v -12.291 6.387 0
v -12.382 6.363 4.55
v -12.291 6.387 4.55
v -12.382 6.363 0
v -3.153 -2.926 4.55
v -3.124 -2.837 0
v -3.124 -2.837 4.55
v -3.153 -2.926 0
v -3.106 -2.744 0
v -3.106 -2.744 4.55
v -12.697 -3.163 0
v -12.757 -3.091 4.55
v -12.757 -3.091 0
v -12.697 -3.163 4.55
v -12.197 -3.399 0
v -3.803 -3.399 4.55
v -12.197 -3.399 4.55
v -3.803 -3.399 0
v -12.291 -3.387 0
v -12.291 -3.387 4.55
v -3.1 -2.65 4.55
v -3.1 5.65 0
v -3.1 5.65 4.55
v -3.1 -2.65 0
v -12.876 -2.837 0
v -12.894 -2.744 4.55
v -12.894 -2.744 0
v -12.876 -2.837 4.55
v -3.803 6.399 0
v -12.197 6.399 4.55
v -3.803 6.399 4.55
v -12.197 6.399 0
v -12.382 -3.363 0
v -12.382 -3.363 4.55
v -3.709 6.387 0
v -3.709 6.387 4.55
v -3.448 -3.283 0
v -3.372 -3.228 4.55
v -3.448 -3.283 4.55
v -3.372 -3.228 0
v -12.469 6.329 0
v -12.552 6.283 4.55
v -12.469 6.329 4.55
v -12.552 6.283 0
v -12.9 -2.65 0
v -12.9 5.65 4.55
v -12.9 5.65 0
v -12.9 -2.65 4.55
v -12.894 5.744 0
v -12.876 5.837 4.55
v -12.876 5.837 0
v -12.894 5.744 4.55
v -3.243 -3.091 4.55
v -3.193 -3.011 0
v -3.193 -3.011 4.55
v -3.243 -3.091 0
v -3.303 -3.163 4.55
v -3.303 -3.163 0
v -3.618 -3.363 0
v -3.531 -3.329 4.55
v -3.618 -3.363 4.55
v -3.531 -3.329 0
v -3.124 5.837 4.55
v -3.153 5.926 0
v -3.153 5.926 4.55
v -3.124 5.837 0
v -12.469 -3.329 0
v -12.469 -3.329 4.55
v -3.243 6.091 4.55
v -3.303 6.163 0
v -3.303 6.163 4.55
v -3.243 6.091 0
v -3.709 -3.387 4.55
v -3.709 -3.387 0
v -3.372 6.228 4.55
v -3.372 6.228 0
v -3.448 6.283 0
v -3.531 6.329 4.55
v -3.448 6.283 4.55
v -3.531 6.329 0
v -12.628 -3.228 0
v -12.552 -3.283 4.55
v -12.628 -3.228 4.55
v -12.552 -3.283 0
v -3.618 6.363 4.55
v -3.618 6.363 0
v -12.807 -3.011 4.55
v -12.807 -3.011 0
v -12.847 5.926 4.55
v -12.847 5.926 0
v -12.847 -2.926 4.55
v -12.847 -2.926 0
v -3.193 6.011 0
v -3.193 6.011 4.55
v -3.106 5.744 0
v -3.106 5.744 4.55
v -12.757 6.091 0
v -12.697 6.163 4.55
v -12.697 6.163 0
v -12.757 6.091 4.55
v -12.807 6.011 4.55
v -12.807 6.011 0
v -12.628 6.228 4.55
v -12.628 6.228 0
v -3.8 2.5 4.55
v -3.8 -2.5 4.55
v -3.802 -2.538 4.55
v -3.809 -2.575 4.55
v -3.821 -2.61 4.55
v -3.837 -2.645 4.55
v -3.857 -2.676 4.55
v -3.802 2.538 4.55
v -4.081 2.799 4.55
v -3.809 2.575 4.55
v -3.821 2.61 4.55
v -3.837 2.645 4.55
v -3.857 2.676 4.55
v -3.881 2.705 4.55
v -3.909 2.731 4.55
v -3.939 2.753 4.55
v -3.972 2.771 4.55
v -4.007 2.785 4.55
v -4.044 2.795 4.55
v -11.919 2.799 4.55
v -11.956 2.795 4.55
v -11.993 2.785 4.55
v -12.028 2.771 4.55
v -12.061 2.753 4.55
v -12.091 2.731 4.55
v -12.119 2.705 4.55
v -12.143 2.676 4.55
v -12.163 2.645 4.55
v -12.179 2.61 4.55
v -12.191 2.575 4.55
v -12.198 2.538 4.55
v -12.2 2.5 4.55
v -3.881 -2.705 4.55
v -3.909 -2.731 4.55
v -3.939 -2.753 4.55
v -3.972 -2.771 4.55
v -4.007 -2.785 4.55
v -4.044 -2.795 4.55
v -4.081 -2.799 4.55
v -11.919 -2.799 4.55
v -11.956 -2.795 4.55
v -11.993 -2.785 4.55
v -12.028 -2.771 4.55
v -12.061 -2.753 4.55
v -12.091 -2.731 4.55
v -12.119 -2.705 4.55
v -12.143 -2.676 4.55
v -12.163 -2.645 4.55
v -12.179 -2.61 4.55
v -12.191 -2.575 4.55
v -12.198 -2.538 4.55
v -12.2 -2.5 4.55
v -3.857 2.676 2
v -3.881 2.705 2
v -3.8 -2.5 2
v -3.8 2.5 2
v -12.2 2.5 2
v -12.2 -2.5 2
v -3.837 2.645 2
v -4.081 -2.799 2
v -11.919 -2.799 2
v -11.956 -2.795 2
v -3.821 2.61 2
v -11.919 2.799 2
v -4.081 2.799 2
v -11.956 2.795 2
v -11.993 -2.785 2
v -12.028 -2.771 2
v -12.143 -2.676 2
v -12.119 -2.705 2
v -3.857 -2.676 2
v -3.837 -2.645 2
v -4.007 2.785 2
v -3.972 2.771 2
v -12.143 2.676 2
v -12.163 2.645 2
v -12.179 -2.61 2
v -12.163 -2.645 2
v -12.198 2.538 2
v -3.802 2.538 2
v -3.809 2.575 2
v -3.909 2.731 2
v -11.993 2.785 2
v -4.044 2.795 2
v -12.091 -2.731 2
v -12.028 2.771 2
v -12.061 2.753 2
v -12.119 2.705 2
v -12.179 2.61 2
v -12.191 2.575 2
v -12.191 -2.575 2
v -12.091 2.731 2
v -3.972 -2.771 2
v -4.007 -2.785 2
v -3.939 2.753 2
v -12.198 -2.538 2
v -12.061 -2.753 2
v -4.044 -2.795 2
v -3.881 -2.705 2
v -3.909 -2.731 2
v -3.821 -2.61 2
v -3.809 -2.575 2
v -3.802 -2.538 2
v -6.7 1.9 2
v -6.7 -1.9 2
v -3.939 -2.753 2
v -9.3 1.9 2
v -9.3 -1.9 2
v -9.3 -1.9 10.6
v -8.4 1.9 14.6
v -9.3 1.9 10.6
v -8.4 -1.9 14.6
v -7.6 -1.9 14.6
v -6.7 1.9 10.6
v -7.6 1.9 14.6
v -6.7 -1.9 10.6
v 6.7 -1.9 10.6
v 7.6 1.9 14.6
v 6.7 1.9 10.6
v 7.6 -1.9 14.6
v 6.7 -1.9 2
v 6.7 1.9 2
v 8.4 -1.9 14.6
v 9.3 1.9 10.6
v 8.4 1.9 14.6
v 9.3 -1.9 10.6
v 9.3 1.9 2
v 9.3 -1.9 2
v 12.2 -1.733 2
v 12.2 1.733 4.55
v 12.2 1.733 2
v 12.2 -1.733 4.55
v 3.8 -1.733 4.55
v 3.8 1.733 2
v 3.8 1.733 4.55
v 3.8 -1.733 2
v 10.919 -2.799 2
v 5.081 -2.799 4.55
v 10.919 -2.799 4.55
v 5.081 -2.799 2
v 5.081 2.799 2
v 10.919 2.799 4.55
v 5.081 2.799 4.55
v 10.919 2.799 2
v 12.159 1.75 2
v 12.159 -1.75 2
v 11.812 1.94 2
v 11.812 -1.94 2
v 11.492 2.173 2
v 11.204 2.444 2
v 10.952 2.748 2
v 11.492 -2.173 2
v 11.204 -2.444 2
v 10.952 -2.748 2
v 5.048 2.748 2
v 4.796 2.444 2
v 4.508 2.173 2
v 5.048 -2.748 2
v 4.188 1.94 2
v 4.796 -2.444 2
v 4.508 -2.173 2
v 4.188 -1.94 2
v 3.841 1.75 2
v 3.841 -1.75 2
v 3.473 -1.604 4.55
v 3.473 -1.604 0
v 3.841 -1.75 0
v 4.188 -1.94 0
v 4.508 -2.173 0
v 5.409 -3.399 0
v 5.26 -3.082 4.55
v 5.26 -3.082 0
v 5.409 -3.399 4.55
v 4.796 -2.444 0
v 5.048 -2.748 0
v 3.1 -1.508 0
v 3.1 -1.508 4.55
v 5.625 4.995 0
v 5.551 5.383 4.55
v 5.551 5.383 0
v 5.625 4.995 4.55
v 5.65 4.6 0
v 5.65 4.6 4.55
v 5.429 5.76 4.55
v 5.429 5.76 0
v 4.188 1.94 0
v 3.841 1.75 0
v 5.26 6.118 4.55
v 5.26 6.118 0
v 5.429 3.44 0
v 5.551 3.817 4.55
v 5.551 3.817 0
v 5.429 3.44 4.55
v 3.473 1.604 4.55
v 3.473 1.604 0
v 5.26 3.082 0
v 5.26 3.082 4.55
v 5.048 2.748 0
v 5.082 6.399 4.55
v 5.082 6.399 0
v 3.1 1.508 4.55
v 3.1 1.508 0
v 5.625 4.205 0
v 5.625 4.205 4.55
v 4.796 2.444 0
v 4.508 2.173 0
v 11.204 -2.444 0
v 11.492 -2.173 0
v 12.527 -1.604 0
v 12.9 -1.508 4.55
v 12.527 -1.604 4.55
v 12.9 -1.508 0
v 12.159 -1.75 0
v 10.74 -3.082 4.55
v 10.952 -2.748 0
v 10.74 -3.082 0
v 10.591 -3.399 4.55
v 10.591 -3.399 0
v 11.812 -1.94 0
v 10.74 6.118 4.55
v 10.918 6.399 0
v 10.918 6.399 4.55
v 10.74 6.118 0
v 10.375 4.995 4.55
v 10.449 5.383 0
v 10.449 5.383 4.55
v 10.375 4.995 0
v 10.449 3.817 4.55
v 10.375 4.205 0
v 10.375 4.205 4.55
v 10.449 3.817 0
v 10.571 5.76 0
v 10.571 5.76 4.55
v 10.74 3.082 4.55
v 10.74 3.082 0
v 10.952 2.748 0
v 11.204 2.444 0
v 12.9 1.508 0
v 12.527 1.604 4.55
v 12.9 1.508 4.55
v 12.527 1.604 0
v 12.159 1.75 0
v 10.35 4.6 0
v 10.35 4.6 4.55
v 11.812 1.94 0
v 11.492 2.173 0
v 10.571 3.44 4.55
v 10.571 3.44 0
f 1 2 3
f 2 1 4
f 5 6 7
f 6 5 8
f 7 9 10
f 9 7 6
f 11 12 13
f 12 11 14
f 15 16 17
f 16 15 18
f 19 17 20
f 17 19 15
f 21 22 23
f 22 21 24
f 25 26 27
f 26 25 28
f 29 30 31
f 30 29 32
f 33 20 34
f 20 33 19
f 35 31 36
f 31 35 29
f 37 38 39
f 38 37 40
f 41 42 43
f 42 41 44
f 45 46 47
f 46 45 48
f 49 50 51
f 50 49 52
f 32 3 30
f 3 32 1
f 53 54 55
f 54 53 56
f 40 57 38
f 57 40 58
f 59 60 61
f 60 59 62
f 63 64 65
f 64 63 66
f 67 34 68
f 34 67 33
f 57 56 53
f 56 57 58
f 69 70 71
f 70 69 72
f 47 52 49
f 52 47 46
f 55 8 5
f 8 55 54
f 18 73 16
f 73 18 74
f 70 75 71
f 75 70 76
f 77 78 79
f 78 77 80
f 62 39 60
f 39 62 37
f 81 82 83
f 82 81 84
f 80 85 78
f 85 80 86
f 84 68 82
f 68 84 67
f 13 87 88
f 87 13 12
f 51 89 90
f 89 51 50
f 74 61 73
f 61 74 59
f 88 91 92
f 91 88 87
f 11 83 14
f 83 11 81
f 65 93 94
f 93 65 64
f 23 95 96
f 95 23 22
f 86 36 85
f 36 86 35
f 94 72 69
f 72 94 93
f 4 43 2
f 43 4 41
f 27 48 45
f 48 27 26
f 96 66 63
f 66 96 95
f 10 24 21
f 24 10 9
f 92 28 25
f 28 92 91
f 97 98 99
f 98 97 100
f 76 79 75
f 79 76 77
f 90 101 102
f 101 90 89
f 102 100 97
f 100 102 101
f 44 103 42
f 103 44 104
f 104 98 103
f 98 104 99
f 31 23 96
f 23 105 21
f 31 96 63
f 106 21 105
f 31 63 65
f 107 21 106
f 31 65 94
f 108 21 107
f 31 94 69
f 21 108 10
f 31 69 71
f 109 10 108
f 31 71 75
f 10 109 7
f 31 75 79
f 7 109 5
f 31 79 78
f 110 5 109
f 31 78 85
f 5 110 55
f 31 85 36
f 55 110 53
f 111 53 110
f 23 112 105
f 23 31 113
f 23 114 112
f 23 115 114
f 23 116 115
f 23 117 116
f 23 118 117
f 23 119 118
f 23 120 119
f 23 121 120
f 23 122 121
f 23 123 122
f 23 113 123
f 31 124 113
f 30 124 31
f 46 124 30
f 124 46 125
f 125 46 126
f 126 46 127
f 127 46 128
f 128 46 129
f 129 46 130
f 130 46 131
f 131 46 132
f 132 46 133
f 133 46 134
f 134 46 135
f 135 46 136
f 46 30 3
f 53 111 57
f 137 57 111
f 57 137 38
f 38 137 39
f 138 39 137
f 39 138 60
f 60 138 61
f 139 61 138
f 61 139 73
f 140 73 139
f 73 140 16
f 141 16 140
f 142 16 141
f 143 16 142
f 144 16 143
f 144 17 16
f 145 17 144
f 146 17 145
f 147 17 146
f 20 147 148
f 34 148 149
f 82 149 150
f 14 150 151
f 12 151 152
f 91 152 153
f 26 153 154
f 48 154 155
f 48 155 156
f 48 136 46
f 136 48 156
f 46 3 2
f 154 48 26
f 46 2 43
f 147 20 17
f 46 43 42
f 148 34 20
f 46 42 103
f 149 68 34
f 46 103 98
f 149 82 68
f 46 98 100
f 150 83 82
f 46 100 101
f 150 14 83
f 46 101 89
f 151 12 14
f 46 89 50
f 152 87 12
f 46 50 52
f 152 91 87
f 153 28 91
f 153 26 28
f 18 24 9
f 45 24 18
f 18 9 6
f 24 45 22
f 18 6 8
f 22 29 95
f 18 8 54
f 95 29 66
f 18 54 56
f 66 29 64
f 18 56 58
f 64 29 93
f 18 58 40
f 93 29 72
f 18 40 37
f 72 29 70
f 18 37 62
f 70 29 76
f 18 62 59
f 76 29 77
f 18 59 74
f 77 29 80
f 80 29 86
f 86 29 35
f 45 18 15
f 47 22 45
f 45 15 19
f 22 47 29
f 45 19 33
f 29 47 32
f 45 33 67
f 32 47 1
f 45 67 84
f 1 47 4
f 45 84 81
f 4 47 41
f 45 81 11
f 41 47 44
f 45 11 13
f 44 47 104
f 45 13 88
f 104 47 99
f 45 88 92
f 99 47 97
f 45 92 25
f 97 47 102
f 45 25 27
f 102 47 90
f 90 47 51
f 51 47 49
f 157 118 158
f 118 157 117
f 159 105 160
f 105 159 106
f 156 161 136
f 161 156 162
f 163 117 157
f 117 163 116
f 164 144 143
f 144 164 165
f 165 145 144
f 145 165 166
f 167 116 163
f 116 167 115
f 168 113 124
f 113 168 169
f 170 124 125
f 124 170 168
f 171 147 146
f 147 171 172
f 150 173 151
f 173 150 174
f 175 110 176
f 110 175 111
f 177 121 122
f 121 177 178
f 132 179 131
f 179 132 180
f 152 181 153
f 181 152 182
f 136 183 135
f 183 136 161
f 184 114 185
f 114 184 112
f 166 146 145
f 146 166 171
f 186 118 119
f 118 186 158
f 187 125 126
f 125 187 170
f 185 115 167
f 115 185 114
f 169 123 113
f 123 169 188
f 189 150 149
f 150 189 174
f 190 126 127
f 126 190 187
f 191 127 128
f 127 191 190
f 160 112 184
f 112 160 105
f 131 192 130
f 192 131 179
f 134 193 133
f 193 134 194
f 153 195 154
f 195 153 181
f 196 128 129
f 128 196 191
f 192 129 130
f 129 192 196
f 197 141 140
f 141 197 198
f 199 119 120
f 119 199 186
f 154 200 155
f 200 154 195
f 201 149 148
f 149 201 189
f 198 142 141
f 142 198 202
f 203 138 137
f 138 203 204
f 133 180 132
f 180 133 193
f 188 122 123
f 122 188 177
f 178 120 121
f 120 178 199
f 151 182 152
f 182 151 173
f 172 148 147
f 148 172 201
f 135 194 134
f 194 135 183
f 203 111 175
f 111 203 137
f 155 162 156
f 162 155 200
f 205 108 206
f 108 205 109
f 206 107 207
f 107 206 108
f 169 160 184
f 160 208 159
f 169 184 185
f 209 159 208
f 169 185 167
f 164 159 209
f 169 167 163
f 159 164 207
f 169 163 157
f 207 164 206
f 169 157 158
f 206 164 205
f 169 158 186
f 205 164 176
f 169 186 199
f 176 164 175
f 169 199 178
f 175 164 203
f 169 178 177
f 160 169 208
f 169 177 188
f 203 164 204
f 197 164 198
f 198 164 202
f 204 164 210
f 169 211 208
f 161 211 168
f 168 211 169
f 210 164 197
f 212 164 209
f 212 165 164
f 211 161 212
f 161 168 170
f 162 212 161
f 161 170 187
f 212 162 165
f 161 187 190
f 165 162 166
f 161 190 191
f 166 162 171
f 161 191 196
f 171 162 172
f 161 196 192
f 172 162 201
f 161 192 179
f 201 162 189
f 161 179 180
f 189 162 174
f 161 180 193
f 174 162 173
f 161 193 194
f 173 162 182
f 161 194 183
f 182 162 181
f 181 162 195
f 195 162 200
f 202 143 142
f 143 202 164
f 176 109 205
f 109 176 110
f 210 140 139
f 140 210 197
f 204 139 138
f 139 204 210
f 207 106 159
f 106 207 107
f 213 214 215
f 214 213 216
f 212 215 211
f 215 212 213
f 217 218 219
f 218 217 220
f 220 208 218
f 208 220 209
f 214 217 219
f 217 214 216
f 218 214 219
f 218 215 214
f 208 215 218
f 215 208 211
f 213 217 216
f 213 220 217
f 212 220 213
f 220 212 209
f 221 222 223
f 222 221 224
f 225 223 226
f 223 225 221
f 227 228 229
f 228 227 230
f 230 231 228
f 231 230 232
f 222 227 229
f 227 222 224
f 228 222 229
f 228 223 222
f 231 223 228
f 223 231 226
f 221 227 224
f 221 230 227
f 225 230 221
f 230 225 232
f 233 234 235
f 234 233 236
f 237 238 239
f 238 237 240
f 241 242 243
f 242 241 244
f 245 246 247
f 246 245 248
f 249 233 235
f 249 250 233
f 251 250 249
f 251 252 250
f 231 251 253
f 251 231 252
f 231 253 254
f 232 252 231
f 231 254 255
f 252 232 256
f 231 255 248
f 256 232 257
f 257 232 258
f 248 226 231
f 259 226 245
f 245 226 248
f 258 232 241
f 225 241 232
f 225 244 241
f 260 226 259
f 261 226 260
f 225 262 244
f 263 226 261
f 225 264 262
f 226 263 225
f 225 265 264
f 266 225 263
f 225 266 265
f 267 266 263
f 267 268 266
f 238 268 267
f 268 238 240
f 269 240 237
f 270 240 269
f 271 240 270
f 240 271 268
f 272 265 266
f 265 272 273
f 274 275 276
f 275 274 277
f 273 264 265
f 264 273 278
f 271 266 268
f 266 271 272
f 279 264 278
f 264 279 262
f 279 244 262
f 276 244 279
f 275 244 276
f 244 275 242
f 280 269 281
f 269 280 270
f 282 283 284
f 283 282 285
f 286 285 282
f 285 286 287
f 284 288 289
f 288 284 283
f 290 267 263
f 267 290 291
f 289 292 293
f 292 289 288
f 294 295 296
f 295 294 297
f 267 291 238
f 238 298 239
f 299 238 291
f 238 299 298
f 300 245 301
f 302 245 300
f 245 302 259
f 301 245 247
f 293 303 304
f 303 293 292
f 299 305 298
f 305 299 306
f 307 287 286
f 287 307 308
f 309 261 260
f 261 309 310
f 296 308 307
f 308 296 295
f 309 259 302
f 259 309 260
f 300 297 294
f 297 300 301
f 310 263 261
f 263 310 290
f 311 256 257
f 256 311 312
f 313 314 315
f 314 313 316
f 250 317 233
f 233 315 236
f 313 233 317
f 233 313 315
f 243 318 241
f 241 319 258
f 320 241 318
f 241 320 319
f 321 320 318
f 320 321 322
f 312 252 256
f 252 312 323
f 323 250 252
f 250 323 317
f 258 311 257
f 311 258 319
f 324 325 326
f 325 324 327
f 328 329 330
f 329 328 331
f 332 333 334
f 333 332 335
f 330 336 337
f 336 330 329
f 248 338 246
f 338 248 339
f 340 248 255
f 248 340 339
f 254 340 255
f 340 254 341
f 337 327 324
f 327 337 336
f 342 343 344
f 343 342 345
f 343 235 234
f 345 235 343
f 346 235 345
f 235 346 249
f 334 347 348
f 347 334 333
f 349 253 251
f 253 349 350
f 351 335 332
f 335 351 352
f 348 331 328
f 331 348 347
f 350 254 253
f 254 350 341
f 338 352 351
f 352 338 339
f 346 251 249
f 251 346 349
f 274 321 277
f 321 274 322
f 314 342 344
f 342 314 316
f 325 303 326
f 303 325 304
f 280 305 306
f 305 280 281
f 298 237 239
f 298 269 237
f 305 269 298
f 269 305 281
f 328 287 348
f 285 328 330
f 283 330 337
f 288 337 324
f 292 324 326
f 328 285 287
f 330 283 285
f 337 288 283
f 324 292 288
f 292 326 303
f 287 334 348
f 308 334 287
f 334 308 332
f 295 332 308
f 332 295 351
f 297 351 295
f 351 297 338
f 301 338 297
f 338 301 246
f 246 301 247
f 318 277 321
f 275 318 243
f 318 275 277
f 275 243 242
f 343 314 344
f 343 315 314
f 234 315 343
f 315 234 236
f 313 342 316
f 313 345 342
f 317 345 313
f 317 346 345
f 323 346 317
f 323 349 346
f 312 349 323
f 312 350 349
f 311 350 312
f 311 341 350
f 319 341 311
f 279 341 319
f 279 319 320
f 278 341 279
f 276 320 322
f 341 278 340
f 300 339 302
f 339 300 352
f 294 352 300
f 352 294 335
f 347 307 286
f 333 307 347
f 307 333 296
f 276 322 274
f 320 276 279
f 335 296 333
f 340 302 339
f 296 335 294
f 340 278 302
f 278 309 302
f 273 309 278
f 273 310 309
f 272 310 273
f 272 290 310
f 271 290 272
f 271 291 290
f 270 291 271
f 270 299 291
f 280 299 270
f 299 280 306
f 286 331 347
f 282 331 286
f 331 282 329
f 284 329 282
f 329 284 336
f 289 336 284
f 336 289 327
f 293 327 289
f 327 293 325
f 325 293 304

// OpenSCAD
translate([-8,0,0]) { 
// Archived geometry from ../../validation_v7_joiners/previous_current/parts/oobb_organization_storage_drawer_unit_rectangle_100_ml_tamper_evident_systempak_209_container_2_column_2_row_ai_version_7_style_unit_2_wide_2_tall/front_plug_square.scad
$fn = 50;

difference() {
	union() {
		translate(v = [0, 0, 0]) {
			rotate(a = [0, 0, 0]) {
				difference() {
					union() {
						translate(v = [0, 0, 0]) {
							rotate(a = [0, 0, 0]) {
								difference() {
									union() {
										translate(v = [0, 0, 0]) {
											rotate(a = [0, 0, 0]) {
												difference() {
													union() {
														translate(v = [0, 1.5, 0]) {
															hull() {
																translate(v = [-4.15, 4.15, 0]) {
																	cylinder(h = 4.55, r = 0.75);
																}
																translate(v = [4.15, 4.15, 0]) {
																	cylinder(h = 4.55, r = 0.75);
																}
																translate(v = [-4.15, -4.15, 0]) {
																	cylinder(h = 4.55, r = 0.75);
																}
																translate(v = [4.15, -4.15, 0]) {
																	cylinder(h = 4.55, r = 0.75);
																}
															}
														}
													}
													union() {
														translate(v = [0, 0, 2.0]) {
															hull() {
																translate(v = [-3.9000000000000004, 2.5, 0]) {
																	cylinder(h = 2.65, r = 0.3);
																}
																translate(v = [3.9000000000000004, 2.5, 0]) {
																	cylinder(h = 2.65, r = 0.3);
																}
																translate(v = [-3.9000000000000004, -2.5, 0]) {
																	cylinder(h = 2.65, r = 0.3);
																}
																translate(v = [3.9000000000000004, -2.5, 0]) {
																	cylinder(h = 2.65, r = 0.3);
																}
															}
														}
													}
												}
											}
										}
										translate(v = [0, 0, 0]) {
											rotate(a = [0, 0, 0]) {
												difference() {
													union() {
														translate(v = [-1.4000000000000001, -1.9, 1.95]) {
															cube(size = [2.8000000000000003, 3.8, 12.65]);
														}
													}
													union() {
														translate(v = [0, 2.0, 0]) {
															rotate(a = [90, 0, 0]) {
																linear_extrude(height = 4.0) {
																	polygon(points = [[-1.3, 1.85], [-1.3, 10.6], [-0.4, 14.6], [-0.4, 14.799999999999999], [-1.6, 14.799999999999999], [-1.6, 1.85]]);
																}
															}
														}
														translate(v = [0, 2.0, 0]) {
															rotate(a = [90, 0, 0]) {
																linear_extrude(height = 4.0) {
																	polygon(points = [[1.3, 1.85], [1.3, 10.6], [0.4, 14.6], [0.4, 14.799999999999999], [1.6, 14.799999999999999], [1.6, 1.85]]);
																}
															}
														}
													}
												}
											}
										}
									}
									union();
								}
							}
						}
					}
					union();
				}
			}
		}
	}
	union();
}
 }
translate([8,0,0]) { 
// Archived geometry from ../../validation_v7_joiners/previous_current/parts/oobb_organization_storage_drawer_unit_rectangle_100_ml_tamper_evident_systempak_209_container_2_column_2_row_ai_version_7_style_unit_2_wide_2_tall/front_plug.scad
$fn = 50;

difference() {
	union() {
		translate(v = [0, 0, 0]) {
			rotate(a = [0, 0, 0]) {
				difference() {
					union() {
						translate(v = [0, 0, 0]) {
							rotate(a = [0, 0, 0]) {
								difference() {
									union() {
										translate(v = [0, 0, 0]) {
											rotate(a = [0, 0, 0]) {
												difference() {
													union() {
														translate(v = [0, 1.5, 0]) {
															hull() {
																translate(v = [-4.15, 4.15, 0]) {
																	cylinder(h = 4.55, r = 0.75);
																}
																translate(v = [4.15, 4.15, 0]) {
																	cylinder(h = 4.55, r = 0.75);
																}
																translate(v = [-4.15, -4.15, 0]) {
																	cylinder(h = 4.55, r = 0.75);
																}
																translate(v = [4.15, -4.15, 0]) {
																	cylinder(h = 4.55, r = 0.75);
																}
															}
														}
													}
													union() {
														translate(v = [0, 0, 2.0]) {
															hull() {
																translate(v = [-3.9000000000000004, 2.5, 0]) {
																	cylinder(h = 2.65, r = 0.3);
																}
																translate(v = [3.9000000000000004, 2.5, 0]) {
																	cylinder(h = 2.65, r = 0.3);
																}
																translate(v = [-3.9000000000000004, -2.5, 0]) {
																	cylinder(h = 2.65, r = 0.3);
																}
																translate(v = [3.9000000000000004, -2.5, 0]) {
																	cylinder(h = 2.65, r = 0.3);
																}
															}
														}
														translate(v = [-5.5, -4.6, -0.1]) {
															cylinder(h = 4.75, r = 3.15);
														}
														translate(v = [-5.5, 4.6, -0.1]) {
															cylinder(h = 4.75, r = 3.15);
														}
														translate(v = [5.5, -4.6, -0.1]) {
															cylinder(h = 4.75, r = 3.15);
														}
														translate(v = [5.5, 4.6, -0.1]) {
															cylinder(h = 4.75, r = 3.15);
														}
													}
												}
											}
										}
										translate(v = [0, 0, 0]) {
											rotate(a = [0, 0, 0]) {
												difference() {
													union() {
														translate(v = [-1.4000000000000001, -1.9, 1.95]) {
															cube(size = [2.8000000000000003, 3.8, 12.65]);
														}
													}
													union() {
														translate(v = [0, 2.0, 0]) {
															rotate(a = [90, 0, 0]) {
																linear_extrude(height = 4.0) {
																	polygon(points = [[-1.3, 1.85], [-1.3, 10.6], [-0.4, 14.6], [-0.4, 14.799999999999999], [-1.6, 14.799999999999999], [-1.6, 1.85]]);
																}
															}
														}
														translate(v = [0, 2.0, 0]) {
															rotate(a = [90, 0, 0]) {
																linear_extrude(height = 4.0) {
																	polygon(points = [[1.3, 1.85], [1.3, 10.6], [0.4, 14.6], [0.4, 14.799999999999999], [1.6, 14.799999999999999], [1.6, 1.85]]);
																}
															}
														}
													}
												}
											}
										}
									}
									union();
								}
							}
						}
					}
					union();
				}
			}
		}
	}
	union();
}
 }
